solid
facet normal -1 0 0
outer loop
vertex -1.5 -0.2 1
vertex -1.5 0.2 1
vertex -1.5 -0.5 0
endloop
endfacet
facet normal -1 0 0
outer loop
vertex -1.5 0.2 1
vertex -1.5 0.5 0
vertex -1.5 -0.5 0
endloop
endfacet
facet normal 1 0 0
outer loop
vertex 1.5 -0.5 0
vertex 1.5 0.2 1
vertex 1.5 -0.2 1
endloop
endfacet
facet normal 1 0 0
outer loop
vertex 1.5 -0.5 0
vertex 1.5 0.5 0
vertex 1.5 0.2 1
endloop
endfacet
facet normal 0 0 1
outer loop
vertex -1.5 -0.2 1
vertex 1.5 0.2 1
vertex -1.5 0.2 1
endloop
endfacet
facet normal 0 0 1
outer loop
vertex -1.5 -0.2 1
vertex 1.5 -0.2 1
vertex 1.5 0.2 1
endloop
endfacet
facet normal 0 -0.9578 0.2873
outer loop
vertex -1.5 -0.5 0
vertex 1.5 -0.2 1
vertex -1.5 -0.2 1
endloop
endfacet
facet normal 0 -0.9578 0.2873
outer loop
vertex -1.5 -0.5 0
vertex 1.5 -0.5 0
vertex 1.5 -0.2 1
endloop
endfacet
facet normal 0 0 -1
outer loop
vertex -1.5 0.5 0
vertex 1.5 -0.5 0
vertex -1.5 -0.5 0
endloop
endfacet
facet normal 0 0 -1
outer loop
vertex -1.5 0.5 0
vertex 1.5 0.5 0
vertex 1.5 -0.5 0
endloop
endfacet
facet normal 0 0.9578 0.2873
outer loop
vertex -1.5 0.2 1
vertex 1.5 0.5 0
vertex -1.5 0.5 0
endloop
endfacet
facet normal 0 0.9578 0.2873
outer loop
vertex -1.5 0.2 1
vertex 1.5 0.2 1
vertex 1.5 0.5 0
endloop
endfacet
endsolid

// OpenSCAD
// Trapezium Prism (Isosceles) for Stacks of Shapes
// by Slashee the Cow

points = [
    [0,0],
    [0.3,1],
    [0.7,1],
    [1,0]
    ];

color("Goldenrod")
translate([-1.5,-0.5,0])
rotate([90,0,90])
linear_extrude(3)
polygon(points, [[0,1,2,3]]);
